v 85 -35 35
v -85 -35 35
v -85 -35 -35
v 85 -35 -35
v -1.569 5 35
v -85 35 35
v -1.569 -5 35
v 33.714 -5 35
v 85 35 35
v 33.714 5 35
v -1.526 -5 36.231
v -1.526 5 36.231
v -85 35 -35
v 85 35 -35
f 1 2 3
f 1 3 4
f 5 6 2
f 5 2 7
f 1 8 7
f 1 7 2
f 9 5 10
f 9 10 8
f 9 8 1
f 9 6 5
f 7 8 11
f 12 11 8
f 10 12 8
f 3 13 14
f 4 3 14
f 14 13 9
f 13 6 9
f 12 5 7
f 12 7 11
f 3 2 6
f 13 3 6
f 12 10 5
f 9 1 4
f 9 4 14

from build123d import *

# Parameters (mm, degrees)
SKETCH_1_W      = 170
SKETCH_1_H      = 70
EXTRUDE_1_DEPTH = 35
EXTRUDE_START   = -35
EXTRUDE_2_DEPTH = 5


with BuildPart() as part:
    # Эскиз1 → Бобышка-Вытянуть1 (new body, symmetric)
    with BuildSketch(Plane.XY):
        Rectangle(SKETCH_1_W, SKETCH_1_H)
    extrude(amount=EXTRUDE_1_DEPTH, both=True)

    # Эскиз2 → Бобышка-Вытянуть2 (add, symmetric)
    with BuildSketch(Plane.XZ.offset(35).offset(EXTRUDE_START)):
        Polygon((33.713551402, 35), (-1.569013743, 35), (-1.526040465, 36.230593665), align=None)
    extrude(amount=EXTRUDE_2_DEPTH, both=True)


solid = part.part
